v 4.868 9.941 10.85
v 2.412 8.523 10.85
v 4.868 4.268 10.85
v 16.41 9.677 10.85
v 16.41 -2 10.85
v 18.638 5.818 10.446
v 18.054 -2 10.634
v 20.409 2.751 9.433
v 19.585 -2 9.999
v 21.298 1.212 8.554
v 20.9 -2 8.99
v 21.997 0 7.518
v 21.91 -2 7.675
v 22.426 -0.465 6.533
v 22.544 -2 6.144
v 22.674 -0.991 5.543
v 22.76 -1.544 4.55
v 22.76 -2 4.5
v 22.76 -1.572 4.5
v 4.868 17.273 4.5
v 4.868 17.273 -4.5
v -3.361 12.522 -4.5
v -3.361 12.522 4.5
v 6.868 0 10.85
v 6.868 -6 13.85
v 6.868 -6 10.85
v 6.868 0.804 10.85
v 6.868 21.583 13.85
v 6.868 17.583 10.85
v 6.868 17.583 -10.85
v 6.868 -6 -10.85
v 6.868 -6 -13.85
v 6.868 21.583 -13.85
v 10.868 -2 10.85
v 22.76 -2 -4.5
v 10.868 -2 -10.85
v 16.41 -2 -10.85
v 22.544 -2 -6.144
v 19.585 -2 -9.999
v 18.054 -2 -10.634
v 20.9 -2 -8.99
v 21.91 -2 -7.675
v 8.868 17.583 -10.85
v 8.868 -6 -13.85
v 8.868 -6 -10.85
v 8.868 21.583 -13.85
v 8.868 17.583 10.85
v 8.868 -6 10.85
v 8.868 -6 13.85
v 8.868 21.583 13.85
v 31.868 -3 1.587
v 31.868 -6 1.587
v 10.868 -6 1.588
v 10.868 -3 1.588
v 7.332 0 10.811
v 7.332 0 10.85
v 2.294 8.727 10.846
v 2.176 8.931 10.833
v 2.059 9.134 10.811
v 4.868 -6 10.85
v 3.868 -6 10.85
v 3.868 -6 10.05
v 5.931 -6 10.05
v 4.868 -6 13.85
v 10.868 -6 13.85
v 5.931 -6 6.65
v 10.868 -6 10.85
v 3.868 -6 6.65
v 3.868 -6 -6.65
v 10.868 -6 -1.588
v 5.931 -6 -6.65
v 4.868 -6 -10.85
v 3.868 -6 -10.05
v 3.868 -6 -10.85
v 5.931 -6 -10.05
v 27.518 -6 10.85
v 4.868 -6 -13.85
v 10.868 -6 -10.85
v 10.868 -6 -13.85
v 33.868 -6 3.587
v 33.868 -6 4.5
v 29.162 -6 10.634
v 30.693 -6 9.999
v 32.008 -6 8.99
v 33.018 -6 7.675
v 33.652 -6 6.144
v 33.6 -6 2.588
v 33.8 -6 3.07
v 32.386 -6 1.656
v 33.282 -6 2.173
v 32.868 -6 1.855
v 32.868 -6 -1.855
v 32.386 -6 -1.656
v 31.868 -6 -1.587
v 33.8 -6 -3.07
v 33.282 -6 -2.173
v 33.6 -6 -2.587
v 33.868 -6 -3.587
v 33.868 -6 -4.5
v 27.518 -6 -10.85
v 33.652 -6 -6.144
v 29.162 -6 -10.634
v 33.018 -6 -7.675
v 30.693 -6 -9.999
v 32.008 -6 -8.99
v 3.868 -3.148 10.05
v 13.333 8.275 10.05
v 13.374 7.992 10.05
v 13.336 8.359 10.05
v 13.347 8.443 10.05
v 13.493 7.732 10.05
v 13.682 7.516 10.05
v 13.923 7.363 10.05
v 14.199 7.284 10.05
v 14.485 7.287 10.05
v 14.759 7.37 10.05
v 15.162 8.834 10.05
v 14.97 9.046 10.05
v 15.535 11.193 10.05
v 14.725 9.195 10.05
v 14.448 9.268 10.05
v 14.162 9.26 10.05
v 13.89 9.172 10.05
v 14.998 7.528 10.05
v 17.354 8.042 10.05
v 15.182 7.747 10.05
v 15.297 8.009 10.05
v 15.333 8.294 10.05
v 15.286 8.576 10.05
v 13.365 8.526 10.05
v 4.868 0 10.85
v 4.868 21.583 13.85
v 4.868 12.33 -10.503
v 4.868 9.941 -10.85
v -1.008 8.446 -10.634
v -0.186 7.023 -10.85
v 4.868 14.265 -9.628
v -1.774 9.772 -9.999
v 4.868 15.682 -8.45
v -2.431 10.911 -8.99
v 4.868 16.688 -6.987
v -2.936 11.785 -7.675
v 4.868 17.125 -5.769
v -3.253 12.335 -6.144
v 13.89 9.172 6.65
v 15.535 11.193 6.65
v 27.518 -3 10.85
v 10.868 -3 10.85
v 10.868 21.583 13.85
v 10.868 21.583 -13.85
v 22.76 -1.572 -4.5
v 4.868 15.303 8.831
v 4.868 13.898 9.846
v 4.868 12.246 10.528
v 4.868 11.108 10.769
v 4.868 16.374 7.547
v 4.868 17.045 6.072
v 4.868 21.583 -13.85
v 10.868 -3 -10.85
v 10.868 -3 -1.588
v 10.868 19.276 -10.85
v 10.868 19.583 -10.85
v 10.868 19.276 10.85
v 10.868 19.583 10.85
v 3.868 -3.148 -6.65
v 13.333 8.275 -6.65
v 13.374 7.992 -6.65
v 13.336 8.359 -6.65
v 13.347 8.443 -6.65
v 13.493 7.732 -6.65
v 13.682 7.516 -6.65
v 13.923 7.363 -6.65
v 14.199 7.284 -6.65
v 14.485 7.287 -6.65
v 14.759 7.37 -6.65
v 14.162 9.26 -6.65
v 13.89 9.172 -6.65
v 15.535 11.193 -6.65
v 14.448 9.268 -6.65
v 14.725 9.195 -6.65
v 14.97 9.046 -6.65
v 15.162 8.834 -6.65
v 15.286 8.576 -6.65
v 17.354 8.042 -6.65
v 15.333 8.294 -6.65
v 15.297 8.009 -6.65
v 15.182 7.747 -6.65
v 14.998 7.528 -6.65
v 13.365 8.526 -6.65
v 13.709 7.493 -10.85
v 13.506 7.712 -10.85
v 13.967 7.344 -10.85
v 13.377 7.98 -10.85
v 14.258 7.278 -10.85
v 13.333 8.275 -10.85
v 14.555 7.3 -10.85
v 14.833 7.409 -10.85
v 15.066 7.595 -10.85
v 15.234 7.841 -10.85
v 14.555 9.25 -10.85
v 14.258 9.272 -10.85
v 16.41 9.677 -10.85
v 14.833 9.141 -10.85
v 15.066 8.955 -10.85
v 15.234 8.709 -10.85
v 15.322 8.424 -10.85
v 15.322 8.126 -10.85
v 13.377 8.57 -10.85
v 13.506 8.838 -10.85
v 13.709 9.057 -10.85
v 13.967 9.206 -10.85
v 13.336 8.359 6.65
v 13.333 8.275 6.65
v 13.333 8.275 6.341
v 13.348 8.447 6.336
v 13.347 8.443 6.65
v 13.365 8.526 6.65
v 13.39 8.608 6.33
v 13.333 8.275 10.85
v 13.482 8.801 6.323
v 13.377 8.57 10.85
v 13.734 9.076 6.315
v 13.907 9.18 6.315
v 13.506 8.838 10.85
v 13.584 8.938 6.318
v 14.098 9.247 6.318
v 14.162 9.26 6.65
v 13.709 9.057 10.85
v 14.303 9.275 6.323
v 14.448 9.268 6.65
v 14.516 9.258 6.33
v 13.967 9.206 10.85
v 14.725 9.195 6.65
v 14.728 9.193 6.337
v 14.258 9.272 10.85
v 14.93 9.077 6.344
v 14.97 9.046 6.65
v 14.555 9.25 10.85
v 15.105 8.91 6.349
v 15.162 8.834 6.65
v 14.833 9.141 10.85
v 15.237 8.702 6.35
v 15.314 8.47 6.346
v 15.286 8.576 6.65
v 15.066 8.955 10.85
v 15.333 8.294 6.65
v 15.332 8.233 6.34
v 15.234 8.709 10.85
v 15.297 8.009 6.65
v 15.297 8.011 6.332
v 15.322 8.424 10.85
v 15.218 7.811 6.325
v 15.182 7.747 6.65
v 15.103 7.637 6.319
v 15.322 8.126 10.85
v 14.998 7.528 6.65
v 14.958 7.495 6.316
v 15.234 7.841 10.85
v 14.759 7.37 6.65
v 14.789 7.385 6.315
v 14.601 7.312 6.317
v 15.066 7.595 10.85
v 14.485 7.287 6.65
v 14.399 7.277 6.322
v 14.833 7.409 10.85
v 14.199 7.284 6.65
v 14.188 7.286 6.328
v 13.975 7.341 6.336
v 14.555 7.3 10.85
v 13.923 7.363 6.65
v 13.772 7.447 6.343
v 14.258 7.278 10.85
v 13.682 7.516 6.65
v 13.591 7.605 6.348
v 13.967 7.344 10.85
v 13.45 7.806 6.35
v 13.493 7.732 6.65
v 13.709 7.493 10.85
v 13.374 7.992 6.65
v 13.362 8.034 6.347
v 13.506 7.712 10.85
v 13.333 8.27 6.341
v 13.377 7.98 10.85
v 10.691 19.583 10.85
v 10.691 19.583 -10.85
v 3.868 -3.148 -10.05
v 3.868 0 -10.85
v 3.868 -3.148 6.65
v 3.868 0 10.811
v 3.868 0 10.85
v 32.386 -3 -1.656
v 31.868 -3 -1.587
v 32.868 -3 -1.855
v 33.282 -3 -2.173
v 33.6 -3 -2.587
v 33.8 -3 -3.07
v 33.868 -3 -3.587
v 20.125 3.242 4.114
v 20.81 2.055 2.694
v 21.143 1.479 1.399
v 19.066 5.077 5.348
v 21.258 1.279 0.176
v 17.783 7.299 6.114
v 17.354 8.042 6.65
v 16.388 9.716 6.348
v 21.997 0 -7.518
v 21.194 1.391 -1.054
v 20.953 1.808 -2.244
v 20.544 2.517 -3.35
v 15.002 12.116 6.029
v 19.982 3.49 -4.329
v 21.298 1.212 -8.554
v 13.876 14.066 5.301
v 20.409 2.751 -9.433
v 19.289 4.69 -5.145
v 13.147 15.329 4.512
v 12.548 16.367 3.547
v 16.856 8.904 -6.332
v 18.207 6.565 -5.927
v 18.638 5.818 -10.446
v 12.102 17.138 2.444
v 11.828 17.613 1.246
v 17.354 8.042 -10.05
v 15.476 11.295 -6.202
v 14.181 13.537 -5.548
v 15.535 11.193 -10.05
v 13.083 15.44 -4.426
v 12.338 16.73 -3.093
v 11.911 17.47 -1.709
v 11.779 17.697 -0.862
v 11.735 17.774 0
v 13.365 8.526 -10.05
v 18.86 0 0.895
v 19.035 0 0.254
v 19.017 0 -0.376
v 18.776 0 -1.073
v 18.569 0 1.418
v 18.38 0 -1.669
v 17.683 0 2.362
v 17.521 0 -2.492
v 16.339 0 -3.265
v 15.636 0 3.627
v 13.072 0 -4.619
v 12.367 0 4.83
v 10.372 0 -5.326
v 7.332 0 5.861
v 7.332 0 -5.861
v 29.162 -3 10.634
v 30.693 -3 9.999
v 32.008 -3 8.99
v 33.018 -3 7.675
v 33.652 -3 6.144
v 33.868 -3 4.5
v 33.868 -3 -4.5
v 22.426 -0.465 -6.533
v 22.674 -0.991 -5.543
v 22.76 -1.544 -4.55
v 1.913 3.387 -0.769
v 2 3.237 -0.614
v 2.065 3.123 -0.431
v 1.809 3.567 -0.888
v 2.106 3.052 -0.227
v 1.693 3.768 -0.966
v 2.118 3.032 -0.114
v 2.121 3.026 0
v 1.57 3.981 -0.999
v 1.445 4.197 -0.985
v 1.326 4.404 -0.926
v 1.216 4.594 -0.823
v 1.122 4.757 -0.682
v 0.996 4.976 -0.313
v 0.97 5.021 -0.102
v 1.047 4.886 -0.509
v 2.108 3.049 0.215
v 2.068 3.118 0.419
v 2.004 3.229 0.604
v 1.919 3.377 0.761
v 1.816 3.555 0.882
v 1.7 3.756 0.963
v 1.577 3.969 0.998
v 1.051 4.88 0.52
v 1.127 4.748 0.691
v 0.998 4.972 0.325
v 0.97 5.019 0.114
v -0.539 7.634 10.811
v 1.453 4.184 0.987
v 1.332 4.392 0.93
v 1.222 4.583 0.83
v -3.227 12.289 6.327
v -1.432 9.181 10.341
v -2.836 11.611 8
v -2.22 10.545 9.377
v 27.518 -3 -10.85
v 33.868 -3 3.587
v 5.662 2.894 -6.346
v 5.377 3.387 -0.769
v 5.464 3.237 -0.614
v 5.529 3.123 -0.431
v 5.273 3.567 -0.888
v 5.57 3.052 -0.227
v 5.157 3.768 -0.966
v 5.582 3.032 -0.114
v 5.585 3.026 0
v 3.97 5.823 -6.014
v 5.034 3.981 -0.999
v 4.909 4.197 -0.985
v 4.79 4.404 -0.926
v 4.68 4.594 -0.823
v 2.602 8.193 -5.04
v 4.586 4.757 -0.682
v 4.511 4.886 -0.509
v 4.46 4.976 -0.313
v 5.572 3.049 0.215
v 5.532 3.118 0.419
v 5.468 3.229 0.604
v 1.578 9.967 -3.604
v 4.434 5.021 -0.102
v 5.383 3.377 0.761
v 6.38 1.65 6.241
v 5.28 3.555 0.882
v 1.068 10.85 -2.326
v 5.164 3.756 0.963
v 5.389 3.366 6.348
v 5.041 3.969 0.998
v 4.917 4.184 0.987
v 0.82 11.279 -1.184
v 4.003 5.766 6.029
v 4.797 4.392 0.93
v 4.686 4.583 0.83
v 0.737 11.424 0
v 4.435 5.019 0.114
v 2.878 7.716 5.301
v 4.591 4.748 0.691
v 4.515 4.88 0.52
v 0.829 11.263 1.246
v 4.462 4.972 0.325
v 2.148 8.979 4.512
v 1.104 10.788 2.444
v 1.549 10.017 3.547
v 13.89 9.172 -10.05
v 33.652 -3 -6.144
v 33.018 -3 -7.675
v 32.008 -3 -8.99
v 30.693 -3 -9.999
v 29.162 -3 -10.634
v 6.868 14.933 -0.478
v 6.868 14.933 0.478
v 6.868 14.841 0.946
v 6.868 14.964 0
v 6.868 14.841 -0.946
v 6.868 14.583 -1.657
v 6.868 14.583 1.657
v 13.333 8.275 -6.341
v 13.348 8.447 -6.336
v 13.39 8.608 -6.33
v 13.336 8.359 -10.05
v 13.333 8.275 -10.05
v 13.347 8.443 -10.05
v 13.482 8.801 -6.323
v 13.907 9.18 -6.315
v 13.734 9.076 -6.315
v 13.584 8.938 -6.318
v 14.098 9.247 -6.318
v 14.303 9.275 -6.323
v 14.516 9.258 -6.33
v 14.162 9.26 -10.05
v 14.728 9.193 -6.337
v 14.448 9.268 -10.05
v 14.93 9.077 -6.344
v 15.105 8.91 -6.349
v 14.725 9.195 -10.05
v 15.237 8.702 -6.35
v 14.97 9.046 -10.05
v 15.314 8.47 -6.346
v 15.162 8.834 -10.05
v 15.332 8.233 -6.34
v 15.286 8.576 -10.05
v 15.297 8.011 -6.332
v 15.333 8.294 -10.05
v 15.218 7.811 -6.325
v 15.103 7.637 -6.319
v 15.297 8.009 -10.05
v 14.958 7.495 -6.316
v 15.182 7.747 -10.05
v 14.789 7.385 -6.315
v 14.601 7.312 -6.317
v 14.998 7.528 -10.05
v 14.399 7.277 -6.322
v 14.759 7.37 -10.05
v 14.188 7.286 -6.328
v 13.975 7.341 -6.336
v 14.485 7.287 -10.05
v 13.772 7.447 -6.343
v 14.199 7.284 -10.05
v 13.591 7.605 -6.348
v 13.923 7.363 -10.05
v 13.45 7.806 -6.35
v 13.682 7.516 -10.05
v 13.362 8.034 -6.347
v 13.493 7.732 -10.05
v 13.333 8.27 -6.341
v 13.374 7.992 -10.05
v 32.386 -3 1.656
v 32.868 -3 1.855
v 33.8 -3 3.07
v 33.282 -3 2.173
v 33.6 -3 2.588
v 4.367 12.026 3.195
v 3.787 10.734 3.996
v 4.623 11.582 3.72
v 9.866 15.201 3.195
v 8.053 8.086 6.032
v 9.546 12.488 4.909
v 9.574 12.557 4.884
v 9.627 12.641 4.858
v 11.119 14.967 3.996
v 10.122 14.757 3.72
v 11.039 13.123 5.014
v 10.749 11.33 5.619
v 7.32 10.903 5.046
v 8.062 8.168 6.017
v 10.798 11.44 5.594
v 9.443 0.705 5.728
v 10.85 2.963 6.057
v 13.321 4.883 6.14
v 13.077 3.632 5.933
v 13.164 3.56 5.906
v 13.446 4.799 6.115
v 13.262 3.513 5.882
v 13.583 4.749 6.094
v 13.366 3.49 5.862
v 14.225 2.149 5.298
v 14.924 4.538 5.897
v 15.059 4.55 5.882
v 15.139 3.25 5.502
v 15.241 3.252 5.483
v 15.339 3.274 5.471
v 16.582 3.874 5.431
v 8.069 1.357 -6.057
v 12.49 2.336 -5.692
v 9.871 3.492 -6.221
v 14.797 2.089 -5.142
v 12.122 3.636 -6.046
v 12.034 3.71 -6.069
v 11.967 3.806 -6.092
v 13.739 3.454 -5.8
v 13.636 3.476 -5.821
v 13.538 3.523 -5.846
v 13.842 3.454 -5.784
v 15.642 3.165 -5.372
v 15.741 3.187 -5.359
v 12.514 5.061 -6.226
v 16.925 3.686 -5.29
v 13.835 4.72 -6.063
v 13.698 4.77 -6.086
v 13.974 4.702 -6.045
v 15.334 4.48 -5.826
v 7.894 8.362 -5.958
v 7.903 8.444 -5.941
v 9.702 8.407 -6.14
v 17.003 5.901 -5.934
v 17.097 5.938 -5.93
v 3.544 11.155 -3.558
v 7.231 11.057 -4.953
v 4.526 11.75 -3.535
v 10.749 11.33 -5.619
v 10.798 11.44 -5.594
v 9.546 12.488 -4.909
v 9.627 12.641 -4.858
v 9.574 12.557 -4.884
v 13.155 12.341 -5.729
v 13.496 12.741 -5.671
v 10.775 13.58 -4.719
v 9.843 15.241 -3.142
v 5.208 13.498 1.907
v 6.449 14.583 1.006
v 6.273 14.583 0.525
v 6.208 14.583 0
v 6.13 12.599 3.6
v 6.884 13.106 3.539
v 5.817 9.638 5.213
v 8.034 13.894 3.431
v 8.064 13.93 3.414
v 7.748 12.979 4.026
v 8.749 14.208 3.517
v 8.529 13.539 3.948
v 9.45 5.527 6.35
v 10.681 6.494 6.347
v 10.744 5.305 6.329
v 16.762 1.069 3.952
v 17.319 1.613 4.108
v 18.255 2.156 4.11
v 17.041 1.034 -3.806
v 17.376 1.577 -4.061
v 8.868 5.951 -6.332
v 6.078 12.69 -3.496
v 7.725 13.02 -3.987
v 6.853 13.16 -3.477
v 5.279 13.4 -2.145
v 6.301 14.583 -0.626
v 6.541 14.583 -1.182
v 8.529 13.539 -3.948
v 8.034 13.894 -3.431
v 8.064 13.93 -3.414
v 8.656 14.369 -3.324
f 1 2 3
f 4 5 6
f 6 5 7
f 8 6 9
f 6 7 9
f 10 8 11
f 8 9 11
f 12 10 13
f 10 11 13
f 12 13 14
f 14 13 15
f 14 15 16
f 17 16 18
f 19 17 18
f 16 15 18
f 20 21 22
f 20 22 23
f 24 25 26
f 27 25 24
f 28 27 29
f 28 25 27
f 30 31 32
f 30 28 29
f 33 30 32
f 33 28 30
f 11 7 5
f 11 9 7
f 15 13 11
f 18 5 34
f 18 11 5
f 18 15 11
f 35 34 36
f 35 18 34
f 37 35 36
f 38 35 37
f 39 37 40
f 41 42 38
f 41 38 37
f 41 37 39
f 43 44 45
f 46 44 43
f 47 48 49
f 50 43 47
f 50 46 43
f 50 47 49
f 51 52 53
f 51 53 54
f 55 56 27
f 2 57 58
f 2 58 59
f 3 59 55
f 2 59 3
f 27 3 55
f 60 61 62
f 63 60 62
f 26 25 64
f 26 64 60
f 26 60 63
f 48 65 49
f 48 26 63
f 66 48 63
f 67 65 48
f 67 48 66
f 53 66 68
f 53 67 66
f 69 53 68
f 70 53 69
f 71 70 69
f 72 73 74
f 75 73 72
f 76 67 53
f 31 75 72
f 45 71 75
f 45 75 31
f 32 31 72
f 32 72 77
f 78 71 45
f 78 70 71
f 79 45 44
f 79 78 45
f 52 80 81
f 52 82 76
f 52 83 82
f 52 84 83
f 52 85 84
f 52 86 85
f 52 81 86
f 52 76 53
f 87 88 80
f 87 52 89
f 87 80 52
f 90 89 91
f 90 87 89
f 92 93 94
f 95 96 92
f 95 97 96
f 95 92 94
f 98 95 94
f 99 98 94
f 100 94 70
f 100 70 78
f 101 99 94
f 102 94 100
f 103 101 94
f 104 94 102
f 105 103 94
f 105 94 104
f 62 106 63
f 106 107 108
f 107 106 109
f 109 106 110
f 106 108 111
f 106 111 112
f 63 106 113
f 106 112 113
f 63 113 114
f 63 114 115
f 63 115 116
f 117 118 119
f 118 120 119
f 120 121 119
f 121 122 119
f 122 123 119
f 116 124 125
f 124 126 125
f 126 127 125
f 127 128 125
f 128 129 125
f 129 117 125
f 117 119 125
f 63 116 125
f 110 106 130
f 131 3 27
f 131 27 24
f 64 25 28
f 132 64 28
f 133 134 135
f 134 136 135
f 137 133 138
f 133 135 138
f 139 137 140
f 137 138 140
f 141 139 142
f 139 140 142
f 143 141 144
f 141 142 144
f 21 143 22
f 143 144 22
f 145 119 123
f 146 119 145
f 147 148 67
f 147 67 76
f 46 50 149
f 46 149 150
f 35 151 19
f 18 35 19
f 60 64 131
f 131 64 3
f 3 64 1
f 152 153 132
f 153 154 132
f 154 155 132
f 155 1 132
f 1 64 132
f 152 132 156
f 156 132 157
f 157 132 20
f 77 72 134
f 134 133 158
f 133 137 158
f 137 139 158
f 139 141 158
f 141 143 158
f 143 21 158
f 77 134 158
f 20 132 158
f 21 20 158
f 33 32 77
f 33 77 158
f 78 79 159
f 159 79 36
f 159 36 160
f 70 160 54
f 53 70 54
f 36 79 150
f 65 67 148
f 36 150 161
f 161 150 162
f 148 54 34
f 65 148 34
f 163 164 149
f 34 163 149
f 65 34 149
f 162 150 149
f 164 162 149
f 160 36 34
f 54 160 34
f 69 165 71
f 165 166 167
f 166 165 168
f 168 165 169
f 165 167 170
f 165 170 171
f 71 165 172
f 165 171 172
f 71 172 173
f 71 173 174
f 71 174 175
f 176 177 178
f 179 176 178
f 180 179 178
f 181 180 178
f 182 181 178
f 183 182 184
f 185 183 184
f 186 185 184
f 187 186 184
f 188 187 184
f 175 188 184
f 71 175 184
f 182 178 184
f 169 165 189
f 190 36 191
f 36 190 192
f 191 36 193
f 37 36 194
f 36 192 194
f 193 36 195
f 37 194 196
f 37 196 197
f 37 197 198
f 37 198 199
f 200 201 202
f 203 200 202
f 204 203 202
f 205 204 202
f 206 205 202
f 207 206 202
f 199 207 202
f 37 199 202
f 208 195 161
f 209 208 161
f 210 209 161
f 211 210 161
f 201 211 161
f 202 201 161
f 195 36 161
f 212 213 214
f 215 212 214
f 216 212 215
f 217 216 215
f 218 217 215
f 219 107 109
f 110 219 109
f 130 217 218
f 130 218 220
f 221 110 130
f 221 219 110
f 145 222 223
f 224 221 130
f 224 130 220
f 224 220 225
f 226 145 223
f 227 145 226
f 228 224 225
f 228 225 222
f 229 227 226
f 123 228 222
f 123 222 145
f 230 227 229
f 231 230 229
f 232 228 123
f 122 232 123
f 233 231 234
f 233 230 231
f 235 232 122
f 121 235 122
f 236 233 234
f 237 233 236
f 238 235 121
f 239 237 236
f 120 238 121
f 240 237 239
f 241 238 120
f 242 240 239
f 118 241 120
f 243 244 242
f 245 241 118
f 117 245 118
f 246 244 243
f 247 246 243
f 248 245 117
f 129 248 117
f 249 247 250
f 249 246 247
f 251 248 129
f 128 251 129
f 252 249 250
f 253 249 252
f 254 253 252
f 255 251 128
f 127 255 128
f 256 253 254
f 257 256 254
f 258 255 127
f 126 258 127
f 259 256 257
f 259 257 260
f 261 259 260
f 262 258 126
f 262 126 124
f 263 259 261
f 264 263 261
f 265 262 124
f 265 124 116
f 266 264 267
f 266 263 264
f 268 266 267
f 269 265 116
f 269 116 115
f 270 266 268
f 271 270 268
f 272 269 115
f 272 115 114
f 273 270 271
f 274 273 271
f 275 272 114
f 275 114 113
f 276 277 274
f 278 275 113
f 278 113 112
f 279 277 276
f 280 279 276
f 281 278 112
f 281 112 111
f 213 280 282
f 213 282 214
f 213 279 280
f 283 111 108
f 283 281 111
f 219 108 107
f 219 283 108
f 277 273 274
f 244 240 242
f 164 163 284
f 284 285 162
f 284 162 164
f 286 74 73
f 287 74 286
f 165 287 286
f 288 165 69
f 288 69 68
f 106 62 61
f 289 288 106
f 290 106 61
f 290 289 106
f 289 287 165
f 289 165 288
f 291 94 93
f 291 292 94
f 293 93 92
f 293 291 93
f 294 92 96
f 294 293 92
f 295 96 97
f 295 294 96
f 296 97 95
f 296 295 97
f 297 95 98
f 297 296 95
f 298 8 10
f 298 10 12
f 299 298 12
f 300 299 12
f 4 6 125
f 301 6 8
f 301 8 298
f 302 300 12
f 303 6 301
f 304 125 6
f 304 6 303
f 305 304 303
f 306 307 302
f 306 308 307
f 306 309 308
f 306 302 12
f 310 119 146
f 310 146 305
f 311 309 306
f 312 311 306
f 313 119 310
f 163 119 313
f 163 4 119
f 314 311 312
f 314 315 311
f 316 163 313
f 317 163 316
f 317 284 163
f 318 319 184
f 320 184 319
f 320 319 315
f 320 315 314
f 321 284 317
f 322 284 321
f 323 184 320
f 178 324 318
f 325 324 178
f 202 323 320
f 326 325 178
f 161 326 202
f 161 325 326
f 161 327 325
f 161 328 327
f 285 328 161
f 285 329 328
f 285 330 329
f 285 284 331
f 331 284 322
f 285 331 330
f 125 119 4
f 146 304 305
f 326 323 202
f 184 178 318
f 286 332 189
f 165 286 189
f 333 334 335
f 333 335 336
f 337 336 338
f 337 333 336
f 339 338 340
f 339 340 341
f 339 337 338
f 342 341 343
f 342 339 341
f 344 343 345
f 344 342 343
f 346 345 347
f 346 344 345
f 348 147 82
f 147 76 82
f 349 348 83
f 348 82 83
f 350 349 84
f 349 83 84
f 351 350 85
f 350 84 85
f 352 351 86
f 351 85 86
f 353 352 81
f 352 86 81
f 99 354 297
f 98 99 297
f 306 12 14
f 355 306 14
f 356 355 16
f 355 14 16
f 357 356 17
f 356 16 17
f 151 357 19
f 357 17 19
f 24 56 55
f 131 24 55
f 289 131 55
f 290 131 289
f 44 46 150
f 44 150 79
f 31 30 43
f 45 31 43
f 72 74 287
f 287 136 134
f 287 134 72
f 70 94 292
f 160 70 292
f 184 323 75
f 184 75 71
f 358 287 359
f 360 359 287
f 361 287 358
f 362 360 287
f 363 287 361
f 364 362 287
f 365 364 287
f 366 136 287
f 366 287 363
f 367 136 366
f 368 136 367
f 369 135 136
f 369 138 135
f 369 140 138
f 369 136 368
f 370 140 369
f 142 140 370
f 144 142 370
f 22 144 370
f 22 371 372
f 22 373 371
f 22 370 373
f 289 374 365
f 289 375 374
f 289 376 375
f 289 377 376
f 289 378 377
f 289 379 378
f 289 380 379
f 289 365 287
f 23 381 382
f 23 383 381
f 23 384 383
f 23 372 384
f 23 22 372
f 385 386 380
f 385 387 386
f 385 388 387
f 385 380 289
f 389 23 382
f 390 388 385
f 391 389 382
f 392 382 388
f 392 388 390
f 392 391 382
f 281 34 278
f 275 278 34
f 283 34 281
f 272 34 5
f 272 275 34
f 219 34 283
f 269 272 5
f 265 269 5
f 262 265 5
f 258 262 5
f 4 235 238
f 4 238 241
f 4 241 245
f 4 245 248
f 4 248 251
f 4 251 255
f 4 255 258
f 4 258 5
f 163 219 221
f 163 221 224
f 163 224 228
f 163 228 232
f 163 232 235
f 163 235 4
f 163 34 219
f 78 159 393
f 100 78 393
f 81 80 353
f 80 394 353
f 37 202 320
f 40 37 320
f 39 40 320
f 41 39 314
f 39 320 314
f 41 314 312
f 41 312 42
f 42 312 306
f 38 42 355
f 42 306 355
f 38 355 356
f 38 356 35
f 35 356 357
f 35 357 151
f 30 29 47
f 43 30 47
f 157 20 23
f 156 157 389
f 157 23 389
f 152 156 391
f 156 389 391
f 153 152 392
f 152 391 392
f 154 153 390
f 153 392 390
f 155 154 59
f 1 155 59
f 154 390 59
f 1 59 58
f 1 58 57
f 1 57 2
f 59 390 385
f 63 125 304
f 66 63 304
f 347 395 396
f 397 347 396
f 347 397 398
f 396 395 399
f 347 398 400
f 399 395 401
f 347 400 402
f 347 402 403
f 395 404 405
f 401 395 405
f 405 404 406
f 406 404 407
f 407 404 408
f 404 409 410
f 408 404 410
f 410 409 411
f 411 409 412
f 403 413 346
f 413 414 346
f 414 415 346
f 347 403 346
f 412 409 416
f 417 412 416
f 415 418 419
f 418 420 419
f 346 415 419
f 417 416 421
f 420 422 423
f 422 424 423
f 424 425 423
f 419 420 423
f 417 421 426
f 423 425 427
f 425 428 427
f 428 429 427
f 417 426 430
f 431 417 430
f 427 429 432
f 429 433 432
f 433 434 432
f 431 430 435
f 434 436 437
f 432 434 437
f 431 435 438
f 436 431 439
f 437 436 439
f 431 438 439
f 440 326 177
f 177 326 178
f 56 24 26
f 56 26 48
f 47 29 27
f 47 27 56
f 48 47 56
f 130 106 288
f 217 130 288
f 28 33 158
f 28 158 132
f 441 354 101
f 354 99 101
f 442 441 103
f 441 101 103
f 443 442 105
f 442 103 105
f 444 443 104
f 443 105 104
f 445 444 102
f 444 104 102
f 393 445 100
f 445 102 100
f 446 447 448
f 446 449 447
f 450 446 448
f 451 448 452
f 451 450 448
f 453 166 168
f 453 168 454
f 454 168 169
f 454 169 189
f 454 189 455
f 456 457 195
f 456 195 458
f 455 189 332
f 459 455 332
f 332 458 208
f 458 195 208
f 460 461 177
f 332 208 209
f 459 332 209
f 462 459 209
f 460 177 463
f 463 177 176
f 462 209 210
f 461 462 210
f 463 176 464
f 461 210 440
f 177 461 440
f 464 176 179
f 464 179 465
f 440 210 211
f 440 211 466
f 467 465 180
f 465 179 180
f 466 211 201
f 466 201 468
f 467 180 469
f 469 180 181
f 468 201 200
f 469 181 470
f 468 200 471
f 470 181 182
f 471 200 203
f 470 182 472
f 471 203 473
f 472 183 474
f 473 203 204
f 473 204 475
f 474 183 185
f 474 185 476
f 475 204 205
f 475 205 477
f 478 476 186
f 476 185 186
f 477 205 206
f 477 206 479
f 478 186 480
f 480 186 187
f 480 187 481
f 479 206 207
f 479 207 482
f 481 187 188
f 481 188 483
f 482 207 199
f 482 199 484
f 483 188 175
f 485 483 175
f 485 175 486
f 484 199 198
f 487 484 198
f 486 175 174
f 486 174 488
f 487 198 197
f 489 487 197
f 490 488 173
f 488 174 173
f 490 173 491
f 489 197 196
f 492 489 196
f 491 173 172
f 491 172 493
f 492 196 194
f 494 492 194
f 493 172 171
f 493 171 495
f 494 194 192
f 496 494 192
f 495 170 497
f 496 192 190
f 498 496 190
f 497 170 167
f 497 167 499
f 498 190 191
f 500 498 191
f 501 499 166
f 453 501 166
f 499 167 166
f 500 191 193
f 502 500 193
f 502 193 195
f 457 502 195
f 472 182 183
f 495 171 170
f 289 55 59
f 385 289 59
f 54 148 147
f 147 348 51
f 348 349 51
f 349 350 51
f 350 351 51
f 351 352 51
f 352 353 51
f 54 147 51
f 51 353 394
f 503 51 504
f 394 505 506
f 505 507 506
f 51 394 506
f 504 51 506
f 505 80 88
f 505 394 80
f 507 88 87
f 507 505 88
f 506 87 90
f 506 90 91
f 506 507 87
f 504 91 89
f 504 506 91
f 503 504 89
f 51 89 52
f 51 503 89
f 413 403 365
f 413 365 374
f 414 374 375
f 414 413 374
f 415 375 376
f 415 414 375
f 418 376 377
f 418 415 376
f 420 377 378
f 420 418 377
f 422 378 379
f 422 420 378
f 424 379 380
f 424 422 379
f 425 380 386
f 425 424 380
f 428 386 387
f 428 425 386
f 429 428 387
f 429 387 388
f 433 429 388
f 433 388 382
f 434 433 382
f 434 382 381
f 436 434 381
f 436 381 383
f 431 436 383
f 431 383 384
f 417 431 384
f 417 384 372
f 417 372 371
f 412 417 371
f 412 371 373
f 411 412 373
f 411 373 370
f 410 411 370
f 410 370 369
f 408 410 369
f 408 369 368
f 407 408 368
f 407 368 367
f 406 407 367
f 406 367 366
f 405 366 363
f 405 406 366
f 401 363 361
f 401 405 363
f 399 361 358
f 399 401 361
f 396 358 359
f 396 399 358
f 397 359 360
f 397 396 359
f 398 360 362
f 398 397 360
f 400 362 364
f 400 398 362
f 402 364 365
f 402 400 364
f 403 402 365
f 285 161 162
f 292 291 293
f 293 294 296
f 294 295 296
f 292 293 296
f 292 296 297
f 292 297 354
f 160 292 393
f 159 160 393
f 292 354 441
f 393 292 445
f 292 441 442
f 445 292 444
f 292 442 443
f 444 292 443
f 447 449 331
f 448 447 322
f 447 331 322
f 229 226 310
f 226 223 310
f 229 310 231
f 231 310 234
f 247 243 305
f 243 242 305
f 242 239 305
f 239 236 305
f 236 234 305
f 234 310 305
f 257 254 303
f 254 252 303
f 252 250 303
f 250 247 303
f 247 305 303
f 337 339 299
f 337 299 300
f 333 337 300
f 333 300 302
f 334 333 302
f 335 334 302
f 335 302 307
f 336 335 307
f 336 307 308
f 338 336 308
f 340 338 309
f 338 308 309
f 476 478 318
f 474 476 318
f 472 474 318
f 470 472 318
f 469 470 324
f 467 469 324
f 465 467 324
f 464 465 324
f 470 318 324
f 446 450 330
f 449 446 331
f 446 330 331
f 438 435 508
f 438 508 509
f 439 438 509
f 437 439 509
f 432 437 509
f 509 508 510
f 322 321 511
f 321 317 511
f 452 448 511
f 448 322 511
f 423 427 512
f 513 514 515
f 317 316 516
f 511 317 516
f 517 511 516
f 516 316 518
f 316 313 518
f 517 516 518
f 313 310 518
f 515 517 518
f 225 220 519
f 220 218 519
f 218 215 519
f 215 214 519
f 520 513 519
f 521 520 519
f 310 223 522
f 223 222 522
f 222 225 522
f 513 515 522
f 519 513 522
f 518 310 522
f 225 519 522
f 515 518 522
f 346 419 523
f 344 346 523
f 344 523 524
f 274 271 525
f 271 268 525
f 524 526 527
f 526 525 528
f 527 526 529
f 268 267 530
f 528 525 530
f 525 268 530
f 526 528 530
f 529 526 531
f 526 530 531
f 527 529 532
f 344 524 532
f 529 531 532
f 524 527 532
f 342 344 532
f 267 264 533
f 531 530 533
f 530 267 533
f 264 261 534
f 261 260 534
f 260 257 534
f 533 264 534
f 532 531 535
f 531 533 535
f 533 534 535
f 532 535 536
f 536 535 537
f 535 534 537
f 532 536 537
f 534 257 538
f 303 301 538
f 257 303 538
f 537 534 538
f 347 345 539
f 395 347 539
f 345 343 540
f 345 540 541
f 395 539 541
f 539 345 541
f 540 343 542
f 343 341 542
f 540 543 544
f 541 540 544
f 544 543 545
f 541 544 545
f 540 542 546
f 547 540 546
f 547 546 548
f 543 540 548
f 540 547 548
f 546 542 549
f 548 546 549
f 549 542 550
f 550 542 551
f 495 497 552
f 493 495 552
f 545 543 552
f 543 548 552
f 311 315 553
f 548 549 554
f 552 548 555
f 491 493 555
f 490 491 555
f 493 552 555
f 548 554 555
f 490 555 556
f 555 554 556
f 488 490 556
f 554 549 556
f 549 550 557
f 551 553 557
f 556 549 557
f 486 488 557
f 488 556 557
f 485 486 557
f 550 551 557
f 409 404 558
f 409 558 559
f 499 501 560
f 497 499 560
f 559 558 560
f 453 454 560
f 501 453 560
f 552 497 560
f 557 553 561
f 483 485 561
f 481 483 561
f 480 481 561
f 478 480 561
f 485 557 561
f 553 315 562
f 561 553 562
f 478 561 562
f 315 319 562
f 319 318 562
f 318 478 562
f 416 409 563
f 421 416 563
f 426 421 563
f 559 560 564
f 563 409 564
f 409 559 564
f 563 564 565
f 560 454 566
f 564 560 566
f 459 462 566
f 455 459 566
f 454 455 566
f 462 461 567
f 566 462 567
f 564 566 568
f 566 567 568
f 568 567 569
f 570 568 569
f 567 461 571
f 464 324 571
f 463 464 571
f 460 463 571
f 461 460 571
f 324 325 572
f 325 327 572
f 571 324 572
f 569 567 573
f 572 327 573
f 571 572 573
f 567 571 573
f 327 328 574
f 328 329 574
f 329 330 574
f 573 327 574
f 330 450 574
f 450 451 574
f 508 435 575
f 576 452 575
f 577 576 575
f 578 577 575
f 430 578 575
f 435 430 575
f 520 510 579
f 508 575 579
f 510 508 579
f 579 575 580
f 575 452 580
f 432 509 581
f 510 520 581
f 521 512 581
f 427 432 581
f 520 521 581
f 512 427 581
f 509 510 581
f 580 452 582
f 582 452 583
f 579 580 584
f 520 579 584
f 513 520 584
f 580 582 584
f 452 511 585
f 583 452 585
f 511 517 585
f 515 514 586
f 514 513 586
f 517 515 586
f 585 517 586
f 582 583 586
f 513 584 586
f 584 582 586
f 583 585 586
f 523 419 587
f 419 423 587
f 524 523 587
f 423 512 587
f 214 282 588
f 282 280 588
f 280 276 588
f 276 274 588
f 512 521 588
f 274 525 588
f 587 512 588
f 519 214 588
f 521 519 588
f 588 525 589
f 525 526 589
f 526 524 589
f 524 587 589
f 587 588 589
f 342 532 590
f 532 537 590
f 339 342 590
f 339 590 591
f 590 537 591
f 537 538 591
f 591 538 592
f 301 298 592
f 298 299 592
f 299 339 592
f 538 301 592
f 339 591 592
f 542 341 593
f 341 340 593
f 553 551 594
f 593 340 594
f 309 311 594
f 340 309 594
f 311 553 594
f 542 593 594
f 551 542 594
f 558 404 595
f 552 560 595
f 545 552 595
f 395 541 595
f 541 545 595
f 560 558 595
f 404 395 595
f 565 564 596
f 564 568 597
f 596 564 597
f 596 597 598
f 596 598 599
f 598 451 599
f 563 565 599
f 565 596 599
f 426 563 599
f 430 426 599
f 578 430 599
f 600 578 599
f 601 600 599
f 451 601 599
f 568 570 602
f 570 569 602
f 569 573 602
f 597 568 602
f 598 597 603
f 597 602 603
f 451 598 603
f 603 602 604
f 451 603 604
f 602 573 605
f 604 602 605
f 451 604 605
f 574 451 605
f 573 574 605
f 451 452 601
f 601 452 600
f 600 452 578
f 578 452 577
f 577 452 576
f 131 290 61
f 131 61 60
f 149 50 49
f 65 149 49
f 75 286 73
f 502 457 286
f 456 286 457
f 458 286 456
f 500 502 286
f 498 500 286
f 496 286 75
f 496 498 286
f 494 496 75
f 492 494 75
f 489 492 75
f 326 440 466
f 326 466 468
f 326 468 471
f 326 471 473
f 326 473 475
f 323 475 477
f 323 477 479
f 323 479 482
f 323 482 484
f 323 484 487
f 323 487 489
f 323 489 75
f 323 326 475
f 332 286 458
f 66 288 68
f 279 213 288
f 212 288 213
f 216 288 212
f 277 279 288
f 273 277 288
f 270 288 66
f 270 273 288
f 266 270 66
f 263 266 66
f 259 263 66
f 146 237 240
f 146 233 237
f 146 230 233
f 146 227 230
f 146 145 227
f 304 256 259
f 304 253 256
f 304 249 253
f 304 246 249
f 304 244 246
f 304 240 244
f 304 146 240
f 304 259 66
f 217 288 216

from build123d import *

# Parameters (mm, degrees)
SKETCH2_W           = 21.7
SKETCH2_H           = 25.05
SKETCH2_RX          = 9.525
SKETCH2_RY          = 6.35
BOSS_EXTRUDE1_DEPTH = 12.7
SKETCH3_W           = 21.660653916
SKETCH3_H           = 25.05
BOSS_EXTRUDE2_DEPTH = 3
SKETCH5_W           = 18.892037138
SKETCH5_H           = 21.7
BOSS_EXTRUDE3_DEPTH = 2
SKETCH6_W           = 30
SKETCH6_H           = 21.7
BOSS_EXTRUDE4_DEPTH = 4
SKETCH7_W           = 21.7
SKETCH7_H           = 1
SKETCH7_W_2         = 3.175
SKETCH7_H_2         = 3
CUT_EXTRUDE2_DEPTH  = 23
SKETCH7_3_W         = 21.7
SKETCH7_3_H         = 7.272473706
CUT_EXTRUDE3_DEPTH  = 44.803879418
SKETCH11_R          = 1
CUT_EXTRUDE8_DEPTH  = 33.487034031
CUT_EXTRUDE4_REACH  = 47.088
SKETCH9_R           = 1
SKETCH15_W          = 3.4
SKETCH15_H          = 3.4
CUT_EXTRUDE9_DEPTH  = 28.443249332
BOSS_EXTRUDE5_DEPTH = 2
BOSS_EXTRUDE6_DEPTH = 2
FILLET5_R           = 6.35
FILLET6_R           = 2
FILLET7_R           = 2
SKETCH19_W          = 2
SKETCH19_H          = 4
CUT_EXTRUDE10_DEPTH = 48.148292291


with BuildPart() as part:
    # Sketch2 → Boss-Extrude1 (new body)
    with BuildSketch(Plane(origin=(16.497783942, 9.525, 0), x_dir=(0, 0, -1), z_dir=(0.8660254037844379, 0.5000000000000013, 0))):
        Rectangle(SKETCH2_W, SKETCH2_H)
        with Locations(Location((0, 0), (0, 0, 90))):
            Ellipse(SKETCH2_RX, SKETCH2_RY, mode=Mode.SUBTRACT)
    extrude(amount=-BOSS_EXTRUDE1_DEPTH)

    # Sketch3 → Boss-Extrude2 (add)
    with BuildSketch(Plane(origin=(5.499261314, 3.175, 0), x_dir=(0, 0, 1), z_dir=(-0.8660254037844379, -0.5000000000000014, 0))):
        with Locations((-0.019673042, 0)):
            Rectangle(SKETCH3_W, SKETCH3_H)
    extrude(amount=BOSS_EXTRUDE2_DEPTH)

    # Sketch5 → Boss-Extrude3 (add)
    with BuildSketch(Plane(origin=(0, 0, 0), x_dir=(-1, 0, 0), z_dir=(0, 1, 0))):
        with Locations((-13.314265373, 0)):
            Rectangle(SKETCH5_W, SKETCH5_H)
    extrude(amount=-BOSS_EXTRUDE3_DEPTH)

    # Sketch6 → Boss-Extrude4 (add)
    with BuildSketch(Plane.XZ.offset(2)):
        with Locations((18.868246804, 0)):
            Rectangle(SKETCH6_W, SKETCH6_H)
    extrude(amount=BOSS_EXTRUDE4_DEPTH)

    # Sketch7 → Cut-Extrude2 (cut)
    with BuildSketch(Plane(origin=(33.868246804, 0, 0), x_dir=(0, 0, -1), z_dir=(1, 0, 0))):
        with Locations((0, -2.5)):
            Rectangle(SKETCH7_W, SKETCH7_H)
        with Locations((0, -4.5)):
            Rectangle(SKETCH7_W_2, SKETCH7_H_2)
    extrude(amount=-CUT_EXTRUDE2_DEPTH, mode=Mode.SUBTRACT)

    # Sketch7<3> → Cut-Extrude3 (cut, through all)
    with BuildSketch(Plane(origin=(33.868246804, 0, 0), x_dir=(0, 0, -1), z_dir=(1, 0, 0))):
        with Locations((0, -9.636236853)):
            Rectangle(SKETCH7_3_W, SKETCH7_3_H)
    extrude(amount=-CUT_EXTRUDE3_DEPTH, mode=Mode.SUBTRACT)

    # Sketch11 → Cut-Extrude8 (cut, through all)
    with BuildSketch(Plane(origin=(19.672783942, 0.194872981, 0), x_dir=(0, 0, -1), z_dir=(-1, 0, 0))):
        with Locations(Location((0, -3.830865705, 0), (0, 0, 90))):
            Circle(SKETCH11_R)
    extrude(amount=CUT_EXTRUDE8_DEPTH, mode=Mode.SUBTRACT)

    # Sketch9 → Cut-Extrude4 (cut, up to next)
    with BuildSketch(Plane(origin=(0, 0, -10.85), x_dir=(-1, 0, 0), z_dir=(0, 0, -1)), mode=Mode.PRIVATE) as cut_extrude4_sk1:
        with Locations((-14.332720433, 8.275)):
            Circle(SKETCH9_R)
    cut_extrude4_tool1 = extrude(cut_extrude4_sk1.sketch, amount=-CUT_EXTRUDE4_REACH, mode=Mode.PRIVATE) & part.part
    cut_extrude4 = cut_extrude4_tool1.solids().sort_by_distance((14.33272, 8.275, -10.85))[0]
    add(cut_extrude4, mode=Mode.SUBTRACT)

    # Sketch15 → Cut-Extrude9 (cut, symmetric)
    with BuildSketch(Plane(origin=(16.497783942, 9.525, 0), x_dir=(0.7757354378747654, -0.6310582623064579, 0), z_dir=(0.6310582623064579, 0.7757354378747654, 0))):
        with Locations((-0.1, -8.35)):
            Rectangle(SKETCH15_W, SKETCH15_H)
    cut_extrude9 = extrude(amount=CUT_EXTRUDE9_DEPTH, both=True, mode=Mode.SUBTRACT)

    # Sketch16 → Boss-Extrude5 (add)
    with BuildSketch(Plane(origin=(8.868246804, 0, 0), x_dir=(0, 0, -1), z_dir=(1, 0, 0))):
        Polygon((-10.85, -6), (-10.85, 19.582708922), (0, 19.582708922), (0, 21.582708922), (-13.85, 21.582708922), (-13.85, -6), align=None)
    boss_extrude5 = extrude(amount=BOSS_EXTRUDE5_DEPTH)

    # Sketch18 → Boss-Extrude6 (add)
    with BuildSketch(Plane.ZY.offset(-6.868246804)):
        Polygon((10.85, -6), (13.85, -6), (13.85, 21.582708922), (0, 21.582708922), (0, 14.582708922), (10.85, 14.582708922), align=None)
    boss_extrude6 = extrude(amount=BOSS_EXTRUDE6_DEPTH)

    # Mirror1: Cut-Extrude4, Cut-Extrude9, Boss-Extrude5, Boss-Extrude6 across plane
    add(cut_extrude4.mirror(Plane.XY), mode=Mode.SUBTRACT)
    add(cut_extrude9.mirror(Plane.XY), mode=Mode.SUBTRACT)
    add(boss_extrude5.mirror(Plane.XY))
    add(boss_extrude6.mirror(Plane.XY))

    # Fillet5
    fillet5_edges = [part.edges().sort_by_distance(p)[0] for p in [
        (22.760283942, -1, 10.85),
        (22.760283942, -1, -10.85),
        (0.753465953, 14.897638014, -10.85),
        (2.052504059, 15.647638014, 10.85),
        (33.868246804, -4.5, -10.85),
        (33.868246804, -4.5, 10.85),
    ]]
    fillet(fillet5_edges, radius=FILLET5_R)

    # Fillet6
    fillet6_edges = [part.edges().sort_by_distance(p)[0] for p in [
        (33.868246804, -4.5, 1.5875),
        (33.868246804, -4.5, -1.5875),
    ]]
    fillet(fillet6_edges, radius=FILLET6_R)

    # Fillet7
    # the kernel refuses this fillet: 2 mm, written as the material it takes off along each edge
    with BuildSketch(Plane(origin=(22.760283942, 0, 8.429393602), x_dir=(0, -1, 0), z_dir=(0, 0, -1))) as fillet7_piece_1:
        with BuildLine():
            CenterArc((1.571757441, 2), FILLET7_R, 218.197977663, 51.802022337)
            Line((0, 0.763238686), (-0.031435149, 0.73850346))
            ThreePointArc((-0.031435149, 0.73850346), (-0.04, 0.381619343), (-0.04, 0))
            Line((-0.04, 0), (0, -0.04))
            Line((0, -0.04), (1.571757441, -0.04))
            Line((1.571757441, -0.04), (1.571757441, 0))
        make_face()
    extrude(amount=16.858787203, mode=Mode.SUBTRACT)

    # Sketch19 → Cut-Extrude10 (cut, through all)
    with BuildSketch(Plane.XY.offset(10.85)):
        with Locations((7.868246804, 19.582708922)):
            Rectangle(SKETCH19_W, SKETCH19_H)
    extrude(amount=-CUT_EXTRUDE10_DEPTH, mode=Mode.SUBTRACT)


solid = part.part
